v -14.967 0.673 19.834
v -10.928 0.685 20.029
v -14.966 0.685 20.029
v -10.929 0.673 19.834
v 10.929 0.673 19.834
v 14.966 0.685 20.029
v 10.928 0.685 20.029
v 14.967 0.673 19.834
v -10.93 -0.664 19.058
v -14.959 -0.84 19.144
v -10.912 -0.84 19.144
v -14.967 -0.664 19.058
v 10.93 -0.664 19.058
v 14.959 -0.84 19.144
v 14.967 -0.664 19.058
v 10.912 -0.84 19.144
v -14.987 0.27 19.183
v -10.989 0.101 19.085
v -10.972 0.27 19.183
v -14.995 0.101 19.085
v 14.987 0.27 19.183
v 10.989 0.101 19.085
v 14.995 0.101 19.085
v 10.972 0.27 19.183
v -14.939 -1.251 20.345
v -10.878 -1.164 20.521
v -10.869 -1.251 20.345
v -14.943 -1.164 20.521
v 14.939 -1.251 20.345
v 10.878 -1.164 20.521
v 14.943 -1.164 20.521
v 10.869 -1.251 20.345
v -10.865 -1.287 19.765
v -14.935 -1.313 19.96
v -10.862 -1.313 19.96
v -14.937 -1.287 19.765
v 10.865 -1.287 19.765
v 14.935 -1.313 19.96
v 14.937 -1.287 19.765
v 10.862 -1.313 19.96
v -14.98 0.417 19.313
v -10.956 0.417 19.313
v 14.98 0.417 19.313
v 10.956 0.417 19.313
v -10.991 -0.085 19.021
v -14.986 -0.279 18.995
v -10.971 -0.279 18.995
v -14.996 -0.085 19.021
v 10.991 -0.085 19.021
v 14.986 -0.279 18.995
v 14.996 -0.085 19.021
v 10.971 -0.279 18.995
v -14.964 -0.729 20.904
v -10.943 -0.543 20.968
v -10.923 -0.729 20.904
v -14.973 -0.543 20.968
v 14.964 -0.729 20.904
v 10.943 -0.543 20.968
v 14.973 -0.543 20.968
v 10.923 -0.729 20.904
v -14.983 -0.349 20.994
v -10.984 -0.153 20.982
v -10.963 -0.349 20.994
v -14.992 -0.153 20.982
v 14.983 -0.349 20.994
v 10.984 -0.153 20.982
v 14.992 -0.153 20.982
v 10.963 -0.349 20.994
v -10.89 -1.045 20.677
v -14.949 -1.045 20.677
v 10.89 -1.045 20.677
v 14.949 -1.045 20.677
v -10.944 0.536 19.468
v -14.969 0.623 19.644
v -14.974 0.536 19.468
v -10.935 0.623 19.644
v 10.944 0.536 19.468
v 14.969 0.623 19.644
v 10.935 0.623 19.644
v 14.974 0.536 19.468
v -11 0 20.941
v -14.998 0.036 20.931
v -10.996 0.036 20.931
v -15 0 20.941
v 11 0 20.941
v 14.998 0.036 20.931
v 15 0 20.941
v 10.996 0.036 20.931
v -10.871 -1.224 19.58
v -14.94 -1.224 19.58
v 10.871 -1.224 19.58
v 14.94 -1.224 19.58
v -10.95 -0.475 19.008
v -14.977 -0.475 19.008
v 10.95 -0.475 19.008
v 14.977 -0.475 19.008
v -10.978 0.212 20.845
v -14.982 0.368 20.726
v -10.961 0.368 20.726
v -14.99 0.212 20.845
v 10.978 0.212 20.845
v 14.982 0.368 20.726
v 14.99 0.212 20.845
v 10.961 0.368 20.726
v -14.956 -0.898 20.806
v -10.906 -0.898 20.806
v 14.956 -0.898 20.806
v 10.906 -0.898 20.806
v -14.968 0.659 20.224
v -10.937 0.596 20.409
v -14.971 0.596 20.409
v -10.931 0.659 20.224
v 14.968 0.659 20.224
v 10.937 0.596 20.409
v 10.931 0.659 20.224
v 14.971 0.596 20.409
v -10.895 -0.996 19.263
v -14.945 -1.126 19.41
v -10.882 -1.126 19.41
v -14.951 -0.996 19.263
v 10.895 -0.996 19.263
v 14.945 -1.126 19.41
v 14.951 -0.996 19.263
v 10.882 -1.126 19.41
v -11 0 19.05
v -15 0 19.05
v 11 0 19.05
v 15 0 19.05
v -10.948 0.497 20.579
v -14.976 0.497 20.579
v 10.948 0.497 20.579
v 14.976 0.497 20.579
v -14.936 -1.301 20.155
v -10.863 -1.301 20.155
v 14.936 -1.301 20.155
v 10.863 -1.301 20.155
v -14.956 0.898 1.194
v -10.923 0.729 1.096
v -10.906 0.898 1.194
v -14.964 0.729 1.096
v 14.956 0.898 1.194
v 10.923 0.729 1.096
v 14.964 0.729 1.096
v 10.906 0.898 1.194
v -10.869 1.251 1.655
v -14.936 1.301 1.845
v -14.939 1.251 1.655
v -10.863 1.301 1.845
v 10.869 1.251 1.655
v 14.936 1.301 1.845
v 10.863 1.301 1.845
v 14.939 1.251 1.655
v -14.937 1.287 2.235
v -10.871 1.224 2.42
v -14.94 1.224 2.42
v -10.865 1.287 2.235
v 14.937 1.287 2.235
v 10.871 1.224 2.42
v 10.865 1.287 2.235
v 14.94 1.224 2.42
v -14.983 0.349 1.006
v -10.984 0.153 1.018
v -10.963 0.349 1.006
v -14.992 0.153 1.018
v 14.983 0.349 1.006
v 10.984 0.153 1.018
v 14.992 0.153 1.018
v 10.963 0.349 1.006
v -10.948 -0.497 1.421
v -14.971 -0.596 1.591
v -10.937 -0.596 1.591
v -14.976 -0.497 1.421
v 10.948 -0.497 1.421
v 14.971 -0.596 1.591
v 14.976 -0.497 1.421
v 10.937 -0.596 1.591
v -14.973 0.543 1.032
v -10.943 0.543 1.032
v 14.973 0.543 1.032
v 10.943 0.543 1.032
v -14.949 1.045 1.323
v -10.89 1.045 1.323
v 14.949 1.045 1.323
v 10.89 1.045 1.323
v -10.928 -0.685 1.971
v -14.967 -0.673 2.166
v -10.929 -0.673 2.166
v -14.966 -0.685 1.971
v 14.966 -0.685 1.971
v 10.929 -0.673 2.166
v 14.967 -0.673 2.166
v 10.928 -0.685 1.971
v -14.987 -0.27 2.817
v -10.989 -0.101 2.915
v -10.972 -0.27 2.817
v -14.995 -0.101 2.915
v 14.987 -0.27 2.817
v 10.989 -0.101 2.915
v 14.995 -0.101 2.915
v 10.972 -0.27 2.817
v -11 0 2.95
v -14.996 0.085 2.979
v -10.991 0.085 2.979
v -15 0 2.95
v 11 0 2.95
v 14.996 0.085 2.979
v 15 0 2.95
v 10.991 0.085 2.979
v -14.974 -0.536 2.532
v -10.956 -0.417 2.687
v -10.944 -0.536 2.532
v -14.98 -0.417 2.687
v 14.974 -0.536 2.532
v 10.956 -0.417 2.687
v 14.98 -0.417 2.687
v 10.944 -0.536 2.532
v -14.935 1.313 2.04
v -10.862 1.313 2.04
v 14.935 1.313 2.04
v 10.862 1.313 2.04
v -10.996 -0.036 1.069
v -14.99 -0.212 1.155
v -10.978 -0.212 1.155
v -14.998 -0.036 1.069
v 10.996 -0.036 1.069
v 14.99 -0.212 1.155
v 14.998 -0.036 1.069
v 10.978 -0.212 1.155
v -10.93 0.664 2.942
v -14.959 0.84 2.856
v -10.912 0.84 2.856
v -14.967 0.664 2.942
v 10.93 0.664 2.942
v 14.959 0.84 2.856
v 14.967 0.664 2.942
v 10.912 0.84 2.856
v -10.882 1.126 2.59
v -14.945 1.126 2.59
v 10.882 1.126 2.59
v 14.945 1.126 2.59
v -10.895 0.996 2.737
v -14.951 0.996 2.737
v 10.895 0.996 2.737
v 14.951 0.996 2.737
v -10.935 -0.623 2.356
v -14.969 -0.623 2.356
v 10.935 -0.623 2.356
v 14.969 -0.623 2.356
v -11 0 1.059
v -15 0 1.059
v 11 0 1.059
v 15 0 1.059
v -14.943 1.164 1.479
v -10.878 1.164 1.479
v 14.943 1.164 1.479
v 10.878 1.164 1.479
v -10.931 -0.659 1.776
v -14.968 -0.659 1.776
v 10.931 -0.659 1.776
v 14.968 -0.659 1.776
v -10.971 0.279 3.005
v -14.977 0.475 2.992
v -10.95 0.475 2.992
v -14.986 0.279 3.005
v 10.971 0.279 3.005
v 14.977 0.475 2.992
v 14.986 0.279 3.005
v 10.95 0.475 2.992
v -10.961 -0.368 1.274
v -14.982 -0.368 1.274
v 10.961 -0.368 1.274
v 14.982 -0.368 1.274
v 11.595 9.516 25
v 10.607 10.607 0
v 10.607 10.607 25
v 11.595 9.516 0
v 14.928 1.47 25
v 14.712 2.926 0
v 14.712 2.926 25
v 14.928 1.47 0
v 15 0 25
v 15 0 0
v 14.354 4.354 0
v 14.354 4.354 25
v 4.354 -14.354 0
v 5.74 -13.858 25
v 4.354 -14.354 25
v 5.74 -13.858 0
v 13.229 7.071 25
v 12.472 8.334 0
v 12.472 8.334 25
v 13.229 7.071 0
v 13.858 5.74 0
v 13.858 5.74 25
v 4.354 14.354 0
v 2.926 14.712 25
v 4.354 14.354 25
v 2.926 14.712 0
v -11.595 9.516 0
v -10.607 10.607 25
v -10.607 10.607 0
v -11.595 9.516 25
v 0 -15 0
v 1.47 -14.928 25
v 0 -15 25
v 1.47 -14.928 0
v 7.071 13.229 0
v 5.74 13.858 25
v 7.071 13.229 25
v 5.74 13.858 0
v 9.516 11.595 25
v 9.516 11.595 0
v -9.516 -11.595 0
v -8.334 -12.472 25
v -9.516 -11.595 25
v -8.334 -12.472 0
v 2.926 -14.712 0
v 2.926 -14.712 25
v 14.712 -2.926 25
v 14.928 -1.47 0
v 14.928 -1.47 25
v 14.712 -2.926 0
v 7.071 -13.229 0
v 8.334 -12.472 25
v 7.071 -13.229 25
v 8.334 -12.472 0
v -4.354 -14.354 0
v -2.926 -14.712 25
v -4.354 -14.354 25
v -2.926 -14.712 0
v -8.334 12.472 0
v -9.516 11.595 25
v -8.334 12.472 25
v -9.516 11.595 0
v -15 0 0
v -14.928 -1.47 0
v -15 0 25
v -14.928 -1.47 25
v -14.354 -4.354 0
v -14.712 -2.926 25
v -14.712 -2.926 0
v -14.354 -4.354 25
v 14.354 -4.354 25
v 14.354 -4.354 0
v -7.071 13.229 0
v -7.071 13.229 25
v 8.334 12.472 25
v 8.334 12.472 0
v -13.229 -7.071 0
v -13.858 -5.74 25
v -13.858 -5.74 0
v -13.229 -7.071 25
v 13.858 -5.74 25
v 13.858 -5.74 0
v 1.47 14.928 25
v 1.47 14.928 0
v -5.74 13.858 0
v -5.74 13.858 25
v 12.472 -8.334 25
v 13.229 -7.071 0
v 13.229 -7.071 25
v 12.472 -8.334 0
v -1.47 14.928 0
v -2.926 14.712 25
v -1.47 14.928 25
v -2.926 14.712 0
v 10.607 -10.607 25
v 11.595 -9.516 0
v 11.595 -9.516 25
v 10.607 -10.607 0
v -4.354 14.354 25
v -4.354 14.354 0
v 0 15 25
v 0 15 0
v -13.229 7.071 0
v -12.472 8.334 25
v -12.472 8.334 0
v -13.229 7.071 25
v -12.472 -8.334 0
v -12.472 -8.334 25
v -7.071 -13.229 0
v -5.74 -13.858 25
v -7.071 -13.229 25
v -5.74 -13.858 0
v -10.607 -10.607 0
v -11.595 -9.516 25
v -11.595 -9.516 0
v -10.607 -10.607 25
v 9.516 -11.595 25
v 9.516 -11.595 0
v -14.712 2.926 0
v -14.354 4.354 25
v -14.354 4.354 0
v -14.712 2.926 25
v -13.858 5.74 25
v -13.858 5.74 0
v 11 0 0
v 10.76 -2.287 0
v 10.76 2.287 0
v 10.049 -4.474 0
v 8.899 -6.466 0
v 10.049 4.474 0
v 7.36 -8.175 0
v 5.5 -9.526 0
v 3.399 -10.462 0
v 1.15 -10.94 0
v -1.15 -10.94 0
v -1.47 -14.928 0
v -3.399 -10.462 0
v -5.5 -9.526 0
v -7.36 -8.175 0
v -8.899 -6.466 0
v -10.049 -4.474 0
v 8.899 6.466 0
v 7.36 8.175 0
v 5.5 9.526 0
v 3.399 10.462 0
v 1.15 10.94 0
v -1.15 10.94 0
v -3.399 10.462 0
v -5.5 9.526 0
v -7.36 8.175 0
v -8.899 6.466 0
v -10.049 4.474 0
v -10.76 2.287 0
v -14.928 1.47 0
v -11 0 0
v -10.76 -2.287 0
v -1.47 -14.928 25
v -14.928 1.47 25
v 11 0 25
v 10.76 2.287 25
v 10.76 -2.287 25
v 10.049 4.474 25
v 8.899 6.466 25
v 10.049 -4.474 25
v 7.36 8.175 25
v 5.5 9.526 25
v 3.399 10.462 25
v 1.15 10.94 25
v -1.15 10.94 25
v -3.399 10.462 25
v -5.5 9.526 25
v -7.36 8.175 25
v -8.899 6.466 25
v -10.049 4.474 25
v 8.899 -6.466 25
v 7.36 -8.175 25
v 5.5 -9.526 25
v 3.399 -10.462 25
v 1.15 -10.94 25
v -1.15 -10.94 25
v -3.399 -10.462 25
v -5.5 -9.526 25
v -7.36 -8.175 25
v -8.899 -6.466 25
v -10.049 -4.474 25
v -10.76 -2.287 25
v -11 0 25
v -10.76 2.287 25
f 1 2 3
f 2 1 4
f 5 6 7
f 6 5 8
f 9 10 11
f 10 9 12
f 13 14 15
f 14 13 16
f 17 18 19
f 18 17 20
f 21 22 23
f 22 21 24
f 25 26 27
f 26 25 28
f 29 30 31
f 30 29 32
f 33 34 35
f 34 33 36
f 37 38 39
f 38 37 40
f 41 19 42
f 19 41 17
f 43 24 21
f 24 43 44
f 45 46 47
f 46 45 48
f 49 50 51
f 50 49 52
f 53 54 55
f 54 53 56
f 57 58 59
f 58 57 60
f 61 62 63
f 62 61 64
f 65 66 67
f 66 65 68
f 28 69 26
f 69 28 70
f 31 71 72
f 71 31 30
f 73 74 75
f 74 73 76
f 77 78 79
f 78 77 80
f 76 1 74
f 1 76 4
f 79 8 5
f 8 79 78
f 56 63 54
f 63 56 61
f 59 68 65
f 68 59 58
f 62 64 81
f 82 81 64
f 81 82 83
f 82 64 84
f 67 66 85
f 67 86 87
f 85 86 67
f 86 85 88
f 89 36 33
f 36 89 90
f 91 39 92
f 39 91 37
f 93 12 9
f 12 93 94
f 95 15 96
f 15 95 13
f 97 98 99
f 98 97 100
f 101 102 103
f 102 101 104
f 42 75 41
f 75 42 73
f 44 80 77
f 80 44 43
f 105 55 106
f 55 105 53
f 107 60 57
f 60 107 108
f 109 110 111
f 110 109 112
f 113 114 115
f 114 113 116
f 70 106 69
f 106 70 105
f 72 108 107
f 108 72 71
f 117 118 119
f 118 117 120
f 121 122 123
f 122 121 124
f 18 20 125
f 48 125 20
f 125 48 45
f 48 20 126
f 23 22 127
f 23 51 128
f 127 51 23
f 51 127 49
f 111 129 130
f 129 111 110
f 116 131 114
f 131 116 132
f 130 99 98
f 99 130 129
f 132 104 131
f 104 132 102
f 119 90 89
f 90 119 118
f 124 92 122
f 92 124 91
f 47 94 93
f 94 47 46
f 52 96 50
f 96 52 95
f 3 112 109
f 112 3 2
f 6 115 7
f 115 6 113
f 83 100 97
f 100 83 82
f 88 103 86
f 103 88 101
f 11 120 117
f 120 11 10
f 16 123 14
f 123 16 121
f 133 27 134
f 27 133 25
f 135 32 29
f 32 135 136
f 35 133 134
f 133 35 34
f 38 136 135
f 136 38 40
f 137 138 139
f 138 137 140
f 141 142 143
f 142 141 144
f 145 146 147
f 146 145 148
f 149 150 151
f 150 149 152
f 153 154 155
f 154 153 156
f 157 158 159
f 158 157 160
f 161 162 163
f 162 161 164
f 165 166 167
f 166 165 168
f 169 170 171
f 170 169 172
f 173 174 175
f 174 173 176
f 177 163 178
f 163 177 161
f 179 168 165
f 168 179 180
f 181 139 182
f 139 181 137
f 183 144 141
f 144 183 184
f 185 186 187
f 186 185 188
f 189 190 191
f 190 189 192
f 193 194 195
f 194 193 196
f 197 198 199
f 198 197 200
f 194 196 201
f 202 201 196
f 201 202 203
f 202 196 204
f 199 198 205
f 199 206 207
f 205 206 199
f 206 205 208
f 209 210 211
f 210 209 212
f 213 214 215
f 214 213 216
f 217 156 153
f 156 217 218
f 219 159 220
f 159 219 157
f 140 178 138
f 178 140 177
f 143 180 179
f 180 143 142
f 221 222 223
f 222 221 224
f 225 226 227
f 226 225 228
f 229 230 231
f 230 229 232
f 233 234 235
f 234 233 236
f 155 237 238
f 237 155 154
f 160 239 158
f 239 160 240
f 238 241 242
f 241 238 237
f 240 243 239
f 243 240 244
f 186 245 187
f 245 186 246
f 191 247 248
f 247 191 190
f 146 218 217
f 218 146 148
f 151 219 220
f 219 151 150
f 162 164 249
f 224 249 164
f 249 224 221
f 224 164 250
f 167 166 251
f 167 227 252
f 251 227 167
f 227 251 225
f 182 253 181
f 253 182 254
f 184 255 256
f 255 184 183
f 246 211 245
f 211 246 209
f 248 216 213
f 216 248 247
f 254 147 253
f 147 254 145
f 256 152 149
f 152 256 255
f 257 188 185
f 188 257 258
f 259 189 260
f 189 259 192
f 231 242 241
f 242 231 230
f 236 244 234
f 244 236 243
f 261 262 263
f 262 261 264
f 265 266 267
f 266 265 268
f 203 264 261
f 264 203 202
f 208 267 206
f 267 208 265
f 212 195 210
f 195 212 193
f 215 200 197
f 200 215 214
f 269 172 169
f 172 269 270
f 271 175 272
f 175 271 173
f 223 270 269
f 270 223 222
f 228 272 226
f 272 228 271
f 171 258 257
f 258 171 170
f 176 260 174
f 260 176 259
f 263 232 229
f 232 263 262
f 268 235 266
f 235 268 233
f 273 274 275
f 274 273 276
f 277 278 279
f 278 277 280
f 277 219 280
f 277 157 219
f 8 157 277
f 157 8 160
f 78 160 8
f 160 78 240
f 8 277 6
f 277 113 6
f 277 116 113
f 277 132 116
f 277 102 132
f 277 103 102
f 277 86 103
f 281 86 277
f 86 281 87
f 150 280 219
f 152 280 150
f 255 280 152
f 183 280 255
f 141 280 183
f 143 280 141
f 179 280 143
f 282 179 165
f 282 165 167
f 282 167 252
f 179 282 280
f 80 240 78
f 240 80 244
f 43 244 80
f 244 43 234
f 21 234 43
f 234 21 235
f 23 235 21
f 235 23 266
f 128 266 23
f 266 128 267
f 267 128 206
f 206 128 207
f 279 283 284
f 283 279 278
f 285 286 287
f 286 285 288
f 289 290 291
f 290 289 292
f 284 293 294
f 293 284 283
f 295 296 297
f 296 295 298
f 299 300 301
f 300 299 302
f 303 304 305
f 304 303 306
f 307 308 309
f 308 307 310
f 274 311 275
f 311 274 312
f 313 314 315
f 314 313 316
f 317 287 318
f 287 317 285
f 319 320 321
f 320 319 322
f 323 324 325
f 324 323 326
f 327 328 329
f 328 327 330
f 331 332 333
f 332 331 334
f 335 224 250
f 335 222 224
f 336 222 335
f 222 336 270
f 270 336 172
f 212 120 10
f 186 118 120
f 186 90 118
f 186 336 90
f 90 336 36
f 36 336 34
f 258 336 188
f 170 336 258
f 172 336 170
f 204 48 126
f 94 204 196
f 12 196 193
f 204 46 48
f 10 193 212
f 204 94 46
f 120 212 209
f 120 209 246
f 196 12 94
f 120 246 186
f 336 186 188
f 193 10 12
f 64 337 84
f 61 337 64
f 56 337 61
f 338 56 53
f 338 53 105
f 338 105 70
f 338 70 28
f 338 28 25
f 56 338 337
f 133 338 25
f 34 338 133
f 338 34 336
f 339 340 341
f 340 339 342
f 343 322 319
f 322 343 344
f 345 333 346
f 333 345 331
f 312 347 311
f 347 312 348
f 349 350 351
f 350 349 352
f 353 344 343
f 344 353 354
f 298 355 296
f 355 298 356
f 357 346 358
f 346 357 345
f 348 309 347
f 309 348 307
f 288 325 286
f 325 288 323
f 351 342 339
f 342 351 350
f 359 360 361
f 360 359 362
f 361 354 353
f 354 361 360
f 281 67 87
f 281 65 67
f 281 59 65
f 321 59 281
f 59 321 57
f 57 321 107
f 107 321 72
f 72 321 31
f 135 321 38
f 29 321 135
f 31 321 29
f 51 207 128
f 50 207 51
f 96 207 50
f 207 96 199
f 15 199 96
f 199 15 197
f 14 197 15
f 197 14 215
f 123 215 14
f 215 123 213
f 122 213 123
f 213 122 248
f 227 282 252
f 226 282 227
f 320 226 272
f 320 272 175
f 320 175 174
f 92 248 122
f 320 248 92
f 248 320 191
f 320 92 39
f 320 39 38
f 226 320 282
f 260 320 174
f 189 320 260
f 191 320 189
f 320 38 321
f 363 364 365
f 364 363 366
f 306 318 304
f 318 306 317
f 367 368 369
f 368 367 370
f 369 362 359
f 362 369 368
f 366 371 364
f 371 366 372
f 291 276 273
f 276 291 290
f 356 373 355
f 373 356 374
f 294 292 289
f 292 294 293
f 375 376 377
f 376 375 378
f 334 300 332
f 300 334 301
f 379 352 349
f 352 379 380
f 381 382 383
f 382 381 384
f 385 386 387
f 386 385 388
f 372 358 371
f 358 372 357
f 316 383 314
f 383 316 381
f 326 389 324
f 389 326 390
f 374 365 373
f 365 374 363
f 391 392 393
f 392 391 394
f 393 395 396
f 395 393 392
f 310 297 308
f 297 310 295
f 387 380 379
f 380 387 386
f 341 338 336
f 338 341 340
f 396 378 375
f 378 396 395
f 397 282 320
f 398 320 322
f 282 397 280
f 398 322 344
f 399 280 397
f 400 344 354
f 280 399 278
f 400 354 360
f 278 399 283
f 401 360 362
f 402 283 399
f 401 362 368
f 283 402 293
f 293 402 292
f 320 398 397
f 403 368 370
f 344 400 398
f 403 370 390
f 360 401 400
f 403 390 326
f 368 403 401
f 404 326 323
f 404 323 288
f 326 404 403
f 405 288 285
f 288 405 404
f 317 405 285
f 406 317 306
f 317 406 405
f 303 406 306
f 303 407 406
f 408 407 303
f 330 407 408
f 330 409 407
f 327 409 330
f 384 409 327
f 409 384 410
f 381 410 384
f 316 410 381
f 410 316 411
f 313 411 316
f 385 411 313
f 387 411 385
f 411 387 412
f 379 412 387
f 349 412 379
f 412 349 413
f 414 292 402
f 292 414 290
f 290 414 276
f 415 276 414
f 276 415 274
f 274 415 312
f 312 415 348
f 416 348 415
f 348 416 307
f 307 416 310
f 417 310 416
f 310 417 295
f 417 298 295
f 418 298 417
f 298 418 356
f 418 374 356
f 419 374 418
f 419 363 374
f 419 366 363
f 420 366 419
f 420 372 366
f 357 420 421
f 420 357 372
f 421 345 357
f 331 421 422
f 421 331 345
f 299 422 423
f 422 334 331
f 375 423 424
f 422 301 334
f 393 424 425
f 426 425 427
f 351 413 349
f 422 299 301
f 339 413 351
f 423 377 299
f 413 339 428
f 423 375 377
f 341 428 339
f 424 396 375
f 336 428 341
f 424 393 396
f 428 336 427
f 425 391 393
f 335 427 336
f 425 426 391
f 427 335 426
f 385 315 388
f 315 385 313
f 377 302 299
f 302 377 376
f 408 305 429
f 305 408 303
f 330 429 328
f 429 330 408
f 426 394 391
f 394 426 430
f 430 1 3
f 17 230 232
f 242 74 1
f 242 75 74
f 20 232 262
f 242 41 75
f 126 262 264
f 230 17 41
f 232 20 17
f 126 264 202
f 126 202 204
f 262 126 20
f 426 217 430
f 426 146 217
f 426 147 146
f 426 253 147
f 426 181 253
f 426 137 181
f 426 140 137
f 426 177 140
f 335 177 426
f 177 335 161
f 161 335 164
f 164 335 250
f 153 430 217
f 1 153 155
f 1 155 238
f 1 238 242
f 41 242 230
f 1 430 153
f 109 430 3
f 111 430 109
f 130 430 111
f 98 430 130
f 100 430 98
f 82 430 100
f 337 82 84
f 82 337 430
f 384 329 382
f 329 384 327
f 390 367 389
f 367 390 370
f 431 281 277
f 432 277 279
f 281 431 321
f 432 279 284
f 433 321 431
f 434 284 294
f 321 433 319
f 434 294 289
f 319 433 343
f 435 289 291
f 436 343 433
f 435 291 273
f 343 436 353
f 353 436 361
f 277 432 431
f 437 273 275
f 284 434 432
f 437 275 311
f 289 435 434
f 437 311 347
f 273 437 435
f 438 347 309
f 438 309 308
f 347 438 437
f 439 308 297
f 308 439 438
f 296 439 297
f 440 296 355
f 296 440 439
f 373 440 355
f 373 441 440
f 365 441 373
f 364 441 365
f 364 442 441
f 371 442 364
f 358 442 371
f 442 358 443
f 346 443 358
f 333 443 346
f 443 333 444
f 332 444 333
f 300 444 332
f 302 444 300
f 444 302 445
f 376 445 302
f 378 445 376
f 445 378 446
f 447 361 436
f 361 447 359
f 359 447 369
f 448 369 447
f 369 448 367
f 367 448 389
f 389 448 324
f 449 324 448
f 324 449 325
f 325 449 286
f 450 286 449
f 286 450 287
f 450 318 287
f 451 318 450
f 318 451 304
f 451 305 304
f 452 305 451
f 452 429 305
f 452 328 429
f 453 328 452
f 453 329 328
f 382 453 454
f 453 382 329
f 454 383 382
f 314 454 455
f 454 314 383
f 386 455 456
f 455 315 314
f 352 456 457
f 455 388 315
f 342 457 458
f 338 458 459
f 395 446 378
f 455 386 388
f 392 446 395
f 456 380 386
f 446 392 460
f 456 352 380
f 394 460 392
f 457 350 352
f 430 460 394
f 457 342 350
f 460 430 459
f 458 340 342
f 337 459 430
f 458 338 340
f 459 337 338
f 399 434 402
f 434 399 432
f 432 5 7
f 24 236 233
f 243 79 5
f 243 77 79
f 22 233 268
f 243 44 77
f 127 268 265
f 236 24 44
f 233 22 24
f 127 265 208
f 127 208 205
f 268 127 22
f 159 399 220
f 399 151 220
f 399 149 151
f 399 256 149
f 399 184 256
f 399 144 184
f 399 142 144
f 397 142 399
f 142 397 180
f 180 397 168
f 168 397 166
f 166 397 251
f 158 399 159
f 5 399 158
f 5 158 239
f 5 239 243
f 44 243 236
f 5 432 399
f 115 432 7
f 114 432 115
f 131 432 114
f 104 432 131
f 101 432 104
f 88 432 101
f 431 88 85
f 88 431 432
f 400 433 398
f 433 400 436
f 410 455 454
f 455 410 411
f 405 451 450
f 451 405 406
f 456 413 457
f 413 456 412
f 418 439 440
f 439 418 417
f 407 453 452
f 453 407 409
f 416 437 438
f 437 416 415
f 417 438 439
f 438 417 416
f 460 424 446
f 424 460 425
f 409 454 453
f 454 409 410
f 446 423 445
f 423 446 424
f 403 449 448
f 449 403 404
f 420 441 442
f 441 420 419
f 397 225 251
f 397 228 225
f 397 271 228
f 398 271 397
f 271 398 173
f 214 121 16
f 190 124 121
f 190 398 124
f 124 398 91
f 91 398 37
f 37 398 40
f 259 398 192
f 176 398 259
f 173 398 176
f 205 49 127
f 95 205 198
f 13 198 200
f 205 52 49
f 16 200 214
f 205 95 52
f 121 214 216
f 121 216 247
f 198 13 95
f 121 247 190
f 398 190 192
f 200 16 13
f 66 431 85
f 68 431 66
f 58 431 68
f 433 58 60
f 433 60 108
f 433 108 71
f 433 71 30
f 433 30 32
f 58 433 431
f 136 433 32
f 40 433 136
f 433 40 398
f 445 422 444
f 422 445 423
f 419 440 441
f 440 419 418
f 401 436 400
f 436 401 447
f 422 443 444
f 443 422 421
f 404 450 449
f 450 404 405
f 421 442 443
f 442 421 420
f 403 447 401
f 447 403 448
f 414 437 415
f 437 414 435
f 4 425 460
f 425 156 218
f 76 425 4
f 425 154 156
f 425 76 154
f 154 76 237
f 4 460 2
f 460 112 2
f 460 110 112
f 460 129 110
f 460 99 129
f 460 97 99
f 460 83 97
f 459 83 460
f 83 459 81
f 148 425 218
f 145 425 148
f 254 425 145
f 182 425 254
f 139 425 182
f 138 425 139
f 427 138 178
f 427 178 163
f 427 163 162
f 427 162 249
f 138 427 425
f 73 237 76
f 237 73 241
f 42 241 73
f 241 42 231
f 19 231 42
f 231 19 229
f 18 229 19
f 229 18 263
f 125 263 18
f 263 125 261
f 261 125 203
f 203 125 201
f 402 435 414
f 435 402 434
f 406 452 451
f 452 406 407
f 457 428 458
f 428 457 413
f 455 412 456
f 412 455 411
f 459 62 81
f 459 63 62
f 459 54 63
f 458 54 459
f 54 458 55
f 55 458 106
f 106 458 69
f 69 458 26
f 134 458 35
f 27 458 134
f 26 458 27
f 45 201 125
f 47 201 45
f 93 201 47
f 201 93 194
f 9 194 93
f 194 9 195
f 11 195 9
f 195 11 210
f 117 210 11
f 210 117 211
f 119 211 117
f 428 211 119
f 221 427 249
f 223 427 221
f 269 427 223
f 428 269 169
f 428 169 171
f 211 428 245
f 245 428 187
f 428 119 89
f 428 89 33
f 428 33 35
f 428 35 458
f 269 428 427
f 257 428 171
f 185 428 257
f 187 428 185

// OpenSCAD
// file: leverArms.scad
use <presser.scad>

armsLen = 60;
distanceR = presser_getR() + 0.5;
profileR = 5;

function leverArms_getProfileR() =  profileR;
function leverArms_getDistanceR() = distanceR;



module leverArms_profile()
{
    circle(r = profileR, $fn = 6);
}

module leverArms()
{
    union()
    {
        translate([-(distanceR + profileR), 0, 0]) rotate([-90,0,0])  linear_extrude(    armsLen) leverArms_profile();
        translate([+(distanceR + profileR), 0, 0]) rotate([-90,0,0])  linear_extrude(    armsLen) leverArms_profile();
    }
}
leverArms();
// file: leverMounting.scad
use <presser.scad>
use <leverArms.scad>

mountingDistance = 18;
mountingBottomHoleCenter = 2;
function mountingHoles_getBottomPosition() = [0,0,mountingBottomHoleCenter];
function mountingHoles_getTopPosition() = [0,0,mountingBottomHoleCenter + mountingDistance];
presserR = presser_getR();
holeR = 1;


module mountingHoles(ang = 0)
{
    translate([0,0,mountingDistance/2 + mountingBottomHoleCenter]) rotate([ang,0,0])    union()
    {
        #translate([-presserR - 15, 0, mountingDistance / 2]) rotate([0, 90, 0]) cylinder(h = 2 * presserR + 30, r = holeR, $fn =32);
        #translate([-presserR - 15, 0, -mountingDistance / 2]) rotate([0, 90, 0]) cylinder(h = 2 * presserR + 30, r = holeR, $fn =32);
    }
    
}
mountingHoles();
// main file
use <leverMounting.scad>


radious = 15;
thickness = 4;
height = 25;

function presser_getR() = radious;
function getPresserAng() = 2;

presser();
module presser()
{
    difference()
    {
        cylinder(h = height, r = radious, $fn =64);
        translate([0,0,-1])cylinder(h = height + 2, r = radious - thickness);
        
        mountingHoles(getPresserAng());
    }
    
}
